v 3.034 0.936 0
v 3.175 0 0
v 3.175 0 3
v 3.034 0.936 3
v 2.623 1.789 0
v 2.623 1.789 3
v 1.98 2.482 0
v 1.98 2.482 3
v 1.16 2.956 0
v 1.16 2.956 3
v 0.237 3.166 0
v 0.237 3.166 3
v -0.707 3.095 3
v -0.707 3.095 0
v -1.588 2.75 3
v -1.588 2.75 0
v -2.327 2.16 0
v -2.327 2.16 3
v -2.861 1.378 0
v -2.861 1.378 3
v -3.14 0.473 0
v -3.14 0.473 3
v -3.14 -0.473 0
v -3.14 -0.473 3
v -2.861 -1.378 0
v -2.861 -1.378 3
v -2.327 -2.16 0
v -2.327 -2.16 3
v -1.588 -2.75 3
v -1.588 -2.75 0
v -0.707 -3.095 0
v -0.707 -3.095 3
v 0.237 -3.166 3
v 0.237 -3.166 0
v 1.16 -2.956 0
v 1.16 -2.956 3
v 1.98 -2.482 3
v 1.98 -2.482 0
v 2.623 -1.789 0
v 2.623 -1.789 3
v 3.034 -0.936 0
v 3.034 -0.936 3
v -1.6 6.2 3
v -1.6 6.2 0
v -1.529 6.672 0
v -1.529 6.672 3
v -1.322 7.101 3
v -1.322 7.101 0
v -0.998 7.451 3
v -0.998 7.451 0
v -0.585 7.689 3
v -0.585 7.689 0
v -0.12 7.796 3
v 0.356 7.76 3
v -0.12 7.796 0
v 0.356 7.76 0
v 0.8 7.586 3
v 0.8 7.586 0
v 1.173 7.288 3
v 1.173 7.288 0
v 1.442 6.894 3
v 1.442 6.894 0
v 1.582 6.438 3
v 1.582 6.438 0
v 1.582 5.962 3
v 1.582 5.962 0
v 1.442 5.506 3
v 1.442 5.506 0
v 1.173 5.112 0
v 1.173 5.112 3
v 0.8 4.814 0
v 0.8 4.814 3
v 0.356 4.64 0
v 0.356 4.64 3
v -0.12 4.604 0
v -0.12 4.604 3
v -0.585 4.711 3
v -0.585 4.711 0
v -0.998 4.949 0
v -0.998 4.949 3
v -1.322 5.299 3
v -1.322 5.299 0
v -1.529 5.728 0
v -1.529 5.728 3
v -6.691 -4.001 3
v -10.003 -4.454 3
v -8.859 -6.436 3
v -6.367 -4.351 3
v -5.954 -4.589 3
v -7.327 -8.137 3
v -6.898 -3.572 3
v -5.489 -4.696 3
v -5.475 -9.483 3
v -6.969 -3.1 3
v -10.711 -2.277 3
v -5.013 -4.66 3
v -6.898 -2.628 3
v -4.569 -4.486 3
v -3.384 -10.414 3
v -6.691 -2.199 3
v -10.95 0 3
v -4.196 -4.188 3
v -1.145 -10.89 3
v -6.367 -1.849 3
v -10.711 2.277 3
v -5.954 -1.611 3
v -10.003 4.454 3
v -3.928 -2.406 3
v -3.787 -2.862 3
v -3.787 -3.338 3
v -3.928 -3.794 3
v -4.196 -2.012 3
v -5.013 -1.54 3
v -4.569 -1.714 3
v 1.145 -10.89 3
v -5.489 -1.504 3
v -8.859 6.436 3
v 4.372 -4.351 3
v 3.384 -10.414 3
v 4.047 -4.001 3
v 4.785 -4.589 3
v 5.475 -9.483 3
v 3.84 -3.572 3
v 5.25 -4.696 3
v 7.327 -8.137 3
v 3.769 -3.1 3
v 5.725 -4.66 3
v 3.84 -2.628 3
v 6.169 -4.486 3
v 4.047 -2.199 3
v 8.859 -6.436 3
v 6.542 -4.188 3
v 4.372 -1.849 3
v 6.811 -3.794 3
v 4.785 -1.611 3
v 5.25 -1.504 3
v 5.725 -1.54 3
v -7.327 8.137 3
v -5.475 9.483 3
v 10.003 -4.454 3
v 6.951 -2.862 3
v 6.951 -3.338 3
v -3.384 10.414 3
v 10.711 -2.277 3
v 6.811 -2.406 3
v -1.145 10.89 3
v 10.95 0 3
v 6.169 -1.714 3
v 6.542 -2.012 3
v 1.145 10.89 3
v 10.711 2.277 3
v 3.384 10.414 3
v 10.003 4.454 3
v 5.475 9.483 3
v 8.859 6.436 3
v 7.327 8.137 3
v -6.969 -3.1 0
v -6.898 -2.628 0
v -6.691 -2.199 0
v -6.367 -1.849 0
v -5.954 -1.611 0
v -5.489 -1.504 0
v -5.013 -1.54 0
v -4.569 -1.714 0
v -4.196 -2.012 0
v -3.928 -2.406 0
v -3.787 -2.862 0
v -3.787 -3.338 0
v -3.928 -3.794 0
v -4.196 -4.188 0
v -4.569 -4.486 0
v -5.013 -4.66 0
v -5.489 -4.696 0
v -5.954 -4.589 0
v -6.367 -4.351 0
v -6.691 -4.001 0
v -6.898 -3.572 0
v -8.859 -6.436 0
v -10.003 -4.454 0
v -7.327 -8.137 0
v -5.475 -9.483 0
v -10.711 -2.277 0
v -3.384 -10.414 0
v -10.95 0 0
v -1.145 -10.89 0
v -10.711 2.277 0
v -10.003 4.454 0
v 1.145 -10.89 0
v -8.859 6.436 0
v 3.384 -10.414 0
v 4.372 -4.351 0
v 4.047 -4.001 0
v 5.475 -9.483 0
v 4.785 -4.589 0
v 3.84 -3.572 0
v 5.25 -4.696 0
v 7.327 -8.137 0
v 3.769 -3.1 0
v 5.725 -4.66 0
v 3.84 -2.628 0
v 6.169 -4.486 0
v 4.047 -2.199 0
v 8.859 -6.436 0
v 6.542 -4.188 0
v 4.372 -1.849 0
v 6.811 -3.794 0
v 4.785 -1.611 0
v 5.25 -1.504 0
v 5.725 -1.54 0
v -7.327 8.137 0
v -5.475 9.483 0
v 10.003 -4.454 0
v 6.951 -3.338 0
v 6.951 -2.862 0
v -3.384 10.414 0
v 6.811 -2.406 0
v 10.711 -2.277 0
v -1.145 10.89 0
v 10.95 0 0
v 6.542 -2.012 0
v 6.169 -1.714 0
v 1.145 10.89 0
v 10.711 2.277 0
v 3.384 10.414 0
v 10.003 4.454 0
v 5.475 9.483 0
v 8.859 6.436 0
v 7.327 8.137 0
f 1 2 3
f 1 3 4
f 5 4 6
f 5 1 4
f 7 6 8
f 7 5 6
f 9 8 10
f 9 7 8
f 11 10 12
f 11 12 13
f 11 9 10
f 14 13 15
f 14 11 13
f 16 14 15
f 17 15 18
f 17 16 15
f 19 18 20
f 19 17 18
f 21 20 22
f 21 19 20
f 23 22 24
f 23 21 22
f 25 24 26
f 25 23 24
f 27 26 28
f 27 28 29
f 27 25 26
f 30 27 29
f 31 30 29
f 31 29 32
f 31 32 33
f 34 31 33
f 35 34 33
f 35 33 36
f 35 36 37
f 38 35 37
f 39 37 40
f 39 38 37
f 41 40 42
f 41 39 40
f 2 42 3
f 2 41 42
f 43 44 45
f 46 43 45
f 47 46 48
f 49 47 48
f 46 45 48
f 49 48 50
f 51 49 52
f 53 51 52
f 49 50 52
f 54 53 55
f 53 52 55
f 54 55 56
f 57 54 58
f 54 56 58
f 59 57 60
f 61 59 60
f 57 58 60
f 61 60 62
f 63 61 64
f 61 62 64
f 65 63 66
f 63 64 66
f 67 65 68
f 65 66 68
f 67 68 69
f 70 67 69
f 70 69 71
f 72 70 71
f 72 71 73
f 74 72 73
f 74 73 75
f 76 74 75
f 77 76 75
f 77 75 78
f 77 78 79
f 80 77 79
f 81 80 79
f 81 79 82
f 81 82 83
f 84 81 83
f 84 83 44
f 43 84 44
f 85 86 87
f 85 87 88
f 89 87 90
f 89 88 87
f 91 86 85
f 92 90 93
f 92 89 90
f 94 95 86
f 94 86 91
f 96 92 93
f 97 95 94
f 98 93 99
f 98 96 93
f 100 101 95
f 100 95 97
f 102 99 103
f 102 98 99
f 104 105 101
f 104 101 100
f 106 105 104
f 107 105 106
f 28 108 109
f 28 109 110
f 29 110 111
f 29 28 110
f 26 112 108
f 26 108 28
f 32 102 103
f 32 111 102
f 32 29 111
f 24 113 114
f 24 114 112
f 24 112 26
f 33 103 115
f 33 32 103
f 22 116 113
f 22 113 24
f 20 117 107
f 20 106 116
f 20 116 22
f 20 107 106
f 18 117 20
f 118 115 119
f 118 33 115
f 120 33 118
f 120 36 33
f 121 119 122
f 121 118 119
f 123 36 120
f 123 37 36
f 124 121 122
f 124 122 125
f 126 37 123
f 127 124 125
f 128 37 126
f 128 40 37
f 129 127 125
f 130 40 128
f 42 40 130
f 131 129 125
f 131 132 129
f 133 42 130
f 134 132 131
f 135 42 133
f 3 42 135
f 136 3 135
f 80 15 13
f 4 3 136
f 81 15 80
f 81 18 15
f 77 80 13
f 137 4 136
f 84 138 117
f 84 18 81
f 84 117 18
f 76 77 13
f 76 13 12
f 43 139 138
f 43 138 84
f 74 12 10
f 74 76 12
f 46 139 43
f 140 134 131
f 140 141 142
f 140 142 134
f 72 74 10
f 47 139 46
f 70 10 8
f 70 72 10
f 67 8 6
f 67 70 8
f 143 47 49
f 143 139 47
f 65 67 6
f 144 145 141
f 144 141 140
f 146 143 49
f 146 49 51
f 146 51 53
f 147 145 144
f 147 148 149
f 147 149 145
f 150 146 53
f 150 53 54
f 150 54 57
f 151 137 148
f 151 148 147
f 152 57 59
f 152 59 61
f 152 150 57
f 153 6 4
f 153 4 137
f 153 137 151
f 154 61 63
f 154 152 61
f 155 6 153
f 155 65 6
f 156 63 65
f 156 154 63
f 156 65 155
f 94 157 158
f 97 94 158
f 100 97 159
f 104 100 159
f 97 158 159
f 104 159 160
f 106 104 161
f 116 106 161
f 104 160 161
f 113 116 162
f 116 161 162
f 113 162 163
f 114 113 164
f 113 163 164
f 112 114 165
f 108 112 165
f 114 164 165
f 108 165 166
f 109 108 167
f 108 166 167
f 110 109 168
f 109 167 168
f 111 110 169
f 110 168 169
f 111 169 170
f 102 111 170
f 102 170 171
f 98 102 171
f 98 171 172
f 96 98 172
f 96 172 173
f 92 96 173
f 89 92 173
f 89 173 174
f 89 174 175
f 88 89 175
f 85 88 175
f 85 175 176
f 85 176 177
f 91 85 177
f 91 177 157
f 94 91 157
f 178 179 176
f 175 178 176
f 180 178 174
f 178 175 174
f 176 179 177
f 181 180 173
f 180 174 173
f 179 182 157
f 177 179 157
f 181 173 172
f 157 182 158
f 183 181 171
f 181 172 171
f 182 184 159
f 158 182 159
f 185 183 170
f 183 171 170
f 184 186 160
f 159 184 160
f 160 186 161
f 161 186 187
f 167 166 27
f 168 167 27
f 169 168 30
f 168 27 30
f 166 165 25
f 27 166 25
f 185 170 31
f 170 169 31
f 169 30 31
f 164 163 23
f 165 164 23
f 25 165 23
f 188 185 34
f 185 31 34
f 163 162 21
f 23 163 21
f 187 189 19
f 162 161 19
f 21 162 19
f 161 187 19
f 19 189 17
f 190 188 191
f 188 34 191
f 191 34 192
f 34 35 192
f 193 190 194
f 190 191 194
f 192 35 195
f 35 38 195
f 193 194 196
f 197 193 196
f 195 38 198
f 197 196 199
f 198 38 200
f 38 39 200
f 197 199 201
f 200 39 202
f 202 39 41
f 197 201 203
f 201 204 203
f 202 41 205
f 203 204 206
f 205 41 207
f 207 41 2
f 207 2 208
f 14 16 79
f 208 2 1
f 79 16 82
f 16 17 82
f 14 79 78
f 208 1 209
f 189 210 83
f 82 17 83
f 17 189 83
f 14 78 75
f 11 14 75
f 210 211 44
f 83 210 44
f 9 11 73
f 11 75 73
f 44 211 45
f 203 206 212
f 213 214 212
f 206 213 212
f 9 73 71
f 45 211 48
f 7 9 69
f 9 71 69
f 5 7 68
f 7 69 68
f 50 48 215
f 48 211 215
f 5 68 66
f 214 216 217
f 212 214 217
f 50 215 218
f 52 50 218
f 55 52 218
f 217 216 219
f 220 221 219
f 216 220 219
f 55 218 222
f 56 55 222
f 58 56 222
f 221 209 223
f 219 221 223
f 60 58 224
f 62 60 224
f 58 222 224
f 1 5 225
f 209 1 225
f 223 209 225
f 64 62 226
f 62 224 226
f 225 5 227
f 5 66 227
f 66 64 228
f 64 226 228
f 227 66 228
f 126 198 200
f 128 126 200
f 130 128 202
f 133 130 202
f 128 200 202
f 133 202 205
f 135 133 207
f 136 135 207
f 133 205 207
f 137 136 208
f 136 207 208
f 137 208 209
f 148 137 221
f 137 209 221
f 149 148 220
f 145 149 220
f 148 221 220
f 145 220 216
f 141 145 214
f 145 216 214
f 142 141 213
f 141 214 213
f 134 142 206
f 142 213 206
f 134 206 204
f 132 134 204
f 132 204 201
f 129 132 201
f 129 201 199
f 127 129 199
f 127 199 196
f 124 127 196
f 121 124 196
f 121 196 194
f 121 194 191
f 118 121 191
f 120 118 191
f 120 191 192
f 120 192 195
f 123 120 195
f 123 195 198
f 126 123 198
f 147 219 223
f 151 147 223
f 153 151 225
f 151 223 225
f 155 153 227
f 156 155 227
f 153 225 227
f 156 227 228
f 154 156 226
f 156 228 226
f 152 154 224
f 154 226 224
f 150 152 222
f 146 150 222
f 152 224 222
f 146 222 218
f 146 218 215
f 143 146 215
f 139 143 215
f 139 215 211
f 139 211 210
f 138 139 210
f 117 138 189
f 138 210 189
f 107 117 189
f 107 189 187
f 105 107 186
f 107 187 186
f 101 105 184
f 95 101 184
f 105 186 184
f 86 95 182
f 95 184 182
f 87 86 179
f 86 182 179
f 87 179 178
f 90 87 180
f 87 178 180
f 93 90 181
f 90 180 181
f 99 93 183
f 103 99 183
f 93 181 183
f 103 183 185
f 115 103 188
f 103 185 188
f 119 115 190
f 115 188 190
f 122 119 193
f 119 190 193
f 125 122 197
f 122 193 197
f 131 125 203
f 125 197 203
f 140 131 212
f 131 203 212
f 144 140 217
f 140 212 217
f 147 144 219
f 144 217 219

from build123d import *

# Parameters (mm, degrees)
SKETCH1_R            = 10.95
SKETCH1_R_2          = 3.175
BOSS_EXTRUDE1_DEPTH  = 3
M3_CLEARANCE_HOLE1_D = 3.2


with BuildPart() as part:
    # Sketch1 → Boss-Extrude1 (new body)
    with BuildSketch(Plane.XY):
        Circle(SKETCH1_R)
        Circle(SKETCH1_R_2, mode=Mode.SUBTRACT)
    extrude(amount=BOSS_EXTRUDE1_DEPTH)

    # M3 Clearance Hole1 (through all)
    with Locations(Plane.XY.offset(3)):
        with Locations((0, 6.2), (-5.369357503, -3.1), (5.369357503, -3.1)):
            Hole(M3_CLEARANCE_HOLE1_D / 2)


solid = part.part
